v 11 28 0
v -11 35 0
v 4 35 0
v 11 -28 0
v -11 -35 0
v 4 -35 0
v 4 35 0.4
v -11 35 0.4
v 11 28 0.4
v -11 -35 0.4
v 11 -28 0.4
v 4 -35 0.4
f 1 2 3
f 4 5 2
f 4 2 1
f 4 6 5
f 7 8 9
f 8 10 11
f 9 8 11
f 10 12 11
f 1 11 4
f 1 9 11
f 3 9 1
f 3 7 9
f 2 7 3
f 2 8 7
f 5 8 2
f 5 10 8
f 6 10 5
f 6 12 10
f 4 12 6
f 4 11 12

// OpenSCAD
linear_extrude(height = 0.4) {
  polygon(points = [[11, -28], [11, 28], [4, 35], [-11, 35], [-11, -35], [4, -35]]);
}
$fn = 50;
